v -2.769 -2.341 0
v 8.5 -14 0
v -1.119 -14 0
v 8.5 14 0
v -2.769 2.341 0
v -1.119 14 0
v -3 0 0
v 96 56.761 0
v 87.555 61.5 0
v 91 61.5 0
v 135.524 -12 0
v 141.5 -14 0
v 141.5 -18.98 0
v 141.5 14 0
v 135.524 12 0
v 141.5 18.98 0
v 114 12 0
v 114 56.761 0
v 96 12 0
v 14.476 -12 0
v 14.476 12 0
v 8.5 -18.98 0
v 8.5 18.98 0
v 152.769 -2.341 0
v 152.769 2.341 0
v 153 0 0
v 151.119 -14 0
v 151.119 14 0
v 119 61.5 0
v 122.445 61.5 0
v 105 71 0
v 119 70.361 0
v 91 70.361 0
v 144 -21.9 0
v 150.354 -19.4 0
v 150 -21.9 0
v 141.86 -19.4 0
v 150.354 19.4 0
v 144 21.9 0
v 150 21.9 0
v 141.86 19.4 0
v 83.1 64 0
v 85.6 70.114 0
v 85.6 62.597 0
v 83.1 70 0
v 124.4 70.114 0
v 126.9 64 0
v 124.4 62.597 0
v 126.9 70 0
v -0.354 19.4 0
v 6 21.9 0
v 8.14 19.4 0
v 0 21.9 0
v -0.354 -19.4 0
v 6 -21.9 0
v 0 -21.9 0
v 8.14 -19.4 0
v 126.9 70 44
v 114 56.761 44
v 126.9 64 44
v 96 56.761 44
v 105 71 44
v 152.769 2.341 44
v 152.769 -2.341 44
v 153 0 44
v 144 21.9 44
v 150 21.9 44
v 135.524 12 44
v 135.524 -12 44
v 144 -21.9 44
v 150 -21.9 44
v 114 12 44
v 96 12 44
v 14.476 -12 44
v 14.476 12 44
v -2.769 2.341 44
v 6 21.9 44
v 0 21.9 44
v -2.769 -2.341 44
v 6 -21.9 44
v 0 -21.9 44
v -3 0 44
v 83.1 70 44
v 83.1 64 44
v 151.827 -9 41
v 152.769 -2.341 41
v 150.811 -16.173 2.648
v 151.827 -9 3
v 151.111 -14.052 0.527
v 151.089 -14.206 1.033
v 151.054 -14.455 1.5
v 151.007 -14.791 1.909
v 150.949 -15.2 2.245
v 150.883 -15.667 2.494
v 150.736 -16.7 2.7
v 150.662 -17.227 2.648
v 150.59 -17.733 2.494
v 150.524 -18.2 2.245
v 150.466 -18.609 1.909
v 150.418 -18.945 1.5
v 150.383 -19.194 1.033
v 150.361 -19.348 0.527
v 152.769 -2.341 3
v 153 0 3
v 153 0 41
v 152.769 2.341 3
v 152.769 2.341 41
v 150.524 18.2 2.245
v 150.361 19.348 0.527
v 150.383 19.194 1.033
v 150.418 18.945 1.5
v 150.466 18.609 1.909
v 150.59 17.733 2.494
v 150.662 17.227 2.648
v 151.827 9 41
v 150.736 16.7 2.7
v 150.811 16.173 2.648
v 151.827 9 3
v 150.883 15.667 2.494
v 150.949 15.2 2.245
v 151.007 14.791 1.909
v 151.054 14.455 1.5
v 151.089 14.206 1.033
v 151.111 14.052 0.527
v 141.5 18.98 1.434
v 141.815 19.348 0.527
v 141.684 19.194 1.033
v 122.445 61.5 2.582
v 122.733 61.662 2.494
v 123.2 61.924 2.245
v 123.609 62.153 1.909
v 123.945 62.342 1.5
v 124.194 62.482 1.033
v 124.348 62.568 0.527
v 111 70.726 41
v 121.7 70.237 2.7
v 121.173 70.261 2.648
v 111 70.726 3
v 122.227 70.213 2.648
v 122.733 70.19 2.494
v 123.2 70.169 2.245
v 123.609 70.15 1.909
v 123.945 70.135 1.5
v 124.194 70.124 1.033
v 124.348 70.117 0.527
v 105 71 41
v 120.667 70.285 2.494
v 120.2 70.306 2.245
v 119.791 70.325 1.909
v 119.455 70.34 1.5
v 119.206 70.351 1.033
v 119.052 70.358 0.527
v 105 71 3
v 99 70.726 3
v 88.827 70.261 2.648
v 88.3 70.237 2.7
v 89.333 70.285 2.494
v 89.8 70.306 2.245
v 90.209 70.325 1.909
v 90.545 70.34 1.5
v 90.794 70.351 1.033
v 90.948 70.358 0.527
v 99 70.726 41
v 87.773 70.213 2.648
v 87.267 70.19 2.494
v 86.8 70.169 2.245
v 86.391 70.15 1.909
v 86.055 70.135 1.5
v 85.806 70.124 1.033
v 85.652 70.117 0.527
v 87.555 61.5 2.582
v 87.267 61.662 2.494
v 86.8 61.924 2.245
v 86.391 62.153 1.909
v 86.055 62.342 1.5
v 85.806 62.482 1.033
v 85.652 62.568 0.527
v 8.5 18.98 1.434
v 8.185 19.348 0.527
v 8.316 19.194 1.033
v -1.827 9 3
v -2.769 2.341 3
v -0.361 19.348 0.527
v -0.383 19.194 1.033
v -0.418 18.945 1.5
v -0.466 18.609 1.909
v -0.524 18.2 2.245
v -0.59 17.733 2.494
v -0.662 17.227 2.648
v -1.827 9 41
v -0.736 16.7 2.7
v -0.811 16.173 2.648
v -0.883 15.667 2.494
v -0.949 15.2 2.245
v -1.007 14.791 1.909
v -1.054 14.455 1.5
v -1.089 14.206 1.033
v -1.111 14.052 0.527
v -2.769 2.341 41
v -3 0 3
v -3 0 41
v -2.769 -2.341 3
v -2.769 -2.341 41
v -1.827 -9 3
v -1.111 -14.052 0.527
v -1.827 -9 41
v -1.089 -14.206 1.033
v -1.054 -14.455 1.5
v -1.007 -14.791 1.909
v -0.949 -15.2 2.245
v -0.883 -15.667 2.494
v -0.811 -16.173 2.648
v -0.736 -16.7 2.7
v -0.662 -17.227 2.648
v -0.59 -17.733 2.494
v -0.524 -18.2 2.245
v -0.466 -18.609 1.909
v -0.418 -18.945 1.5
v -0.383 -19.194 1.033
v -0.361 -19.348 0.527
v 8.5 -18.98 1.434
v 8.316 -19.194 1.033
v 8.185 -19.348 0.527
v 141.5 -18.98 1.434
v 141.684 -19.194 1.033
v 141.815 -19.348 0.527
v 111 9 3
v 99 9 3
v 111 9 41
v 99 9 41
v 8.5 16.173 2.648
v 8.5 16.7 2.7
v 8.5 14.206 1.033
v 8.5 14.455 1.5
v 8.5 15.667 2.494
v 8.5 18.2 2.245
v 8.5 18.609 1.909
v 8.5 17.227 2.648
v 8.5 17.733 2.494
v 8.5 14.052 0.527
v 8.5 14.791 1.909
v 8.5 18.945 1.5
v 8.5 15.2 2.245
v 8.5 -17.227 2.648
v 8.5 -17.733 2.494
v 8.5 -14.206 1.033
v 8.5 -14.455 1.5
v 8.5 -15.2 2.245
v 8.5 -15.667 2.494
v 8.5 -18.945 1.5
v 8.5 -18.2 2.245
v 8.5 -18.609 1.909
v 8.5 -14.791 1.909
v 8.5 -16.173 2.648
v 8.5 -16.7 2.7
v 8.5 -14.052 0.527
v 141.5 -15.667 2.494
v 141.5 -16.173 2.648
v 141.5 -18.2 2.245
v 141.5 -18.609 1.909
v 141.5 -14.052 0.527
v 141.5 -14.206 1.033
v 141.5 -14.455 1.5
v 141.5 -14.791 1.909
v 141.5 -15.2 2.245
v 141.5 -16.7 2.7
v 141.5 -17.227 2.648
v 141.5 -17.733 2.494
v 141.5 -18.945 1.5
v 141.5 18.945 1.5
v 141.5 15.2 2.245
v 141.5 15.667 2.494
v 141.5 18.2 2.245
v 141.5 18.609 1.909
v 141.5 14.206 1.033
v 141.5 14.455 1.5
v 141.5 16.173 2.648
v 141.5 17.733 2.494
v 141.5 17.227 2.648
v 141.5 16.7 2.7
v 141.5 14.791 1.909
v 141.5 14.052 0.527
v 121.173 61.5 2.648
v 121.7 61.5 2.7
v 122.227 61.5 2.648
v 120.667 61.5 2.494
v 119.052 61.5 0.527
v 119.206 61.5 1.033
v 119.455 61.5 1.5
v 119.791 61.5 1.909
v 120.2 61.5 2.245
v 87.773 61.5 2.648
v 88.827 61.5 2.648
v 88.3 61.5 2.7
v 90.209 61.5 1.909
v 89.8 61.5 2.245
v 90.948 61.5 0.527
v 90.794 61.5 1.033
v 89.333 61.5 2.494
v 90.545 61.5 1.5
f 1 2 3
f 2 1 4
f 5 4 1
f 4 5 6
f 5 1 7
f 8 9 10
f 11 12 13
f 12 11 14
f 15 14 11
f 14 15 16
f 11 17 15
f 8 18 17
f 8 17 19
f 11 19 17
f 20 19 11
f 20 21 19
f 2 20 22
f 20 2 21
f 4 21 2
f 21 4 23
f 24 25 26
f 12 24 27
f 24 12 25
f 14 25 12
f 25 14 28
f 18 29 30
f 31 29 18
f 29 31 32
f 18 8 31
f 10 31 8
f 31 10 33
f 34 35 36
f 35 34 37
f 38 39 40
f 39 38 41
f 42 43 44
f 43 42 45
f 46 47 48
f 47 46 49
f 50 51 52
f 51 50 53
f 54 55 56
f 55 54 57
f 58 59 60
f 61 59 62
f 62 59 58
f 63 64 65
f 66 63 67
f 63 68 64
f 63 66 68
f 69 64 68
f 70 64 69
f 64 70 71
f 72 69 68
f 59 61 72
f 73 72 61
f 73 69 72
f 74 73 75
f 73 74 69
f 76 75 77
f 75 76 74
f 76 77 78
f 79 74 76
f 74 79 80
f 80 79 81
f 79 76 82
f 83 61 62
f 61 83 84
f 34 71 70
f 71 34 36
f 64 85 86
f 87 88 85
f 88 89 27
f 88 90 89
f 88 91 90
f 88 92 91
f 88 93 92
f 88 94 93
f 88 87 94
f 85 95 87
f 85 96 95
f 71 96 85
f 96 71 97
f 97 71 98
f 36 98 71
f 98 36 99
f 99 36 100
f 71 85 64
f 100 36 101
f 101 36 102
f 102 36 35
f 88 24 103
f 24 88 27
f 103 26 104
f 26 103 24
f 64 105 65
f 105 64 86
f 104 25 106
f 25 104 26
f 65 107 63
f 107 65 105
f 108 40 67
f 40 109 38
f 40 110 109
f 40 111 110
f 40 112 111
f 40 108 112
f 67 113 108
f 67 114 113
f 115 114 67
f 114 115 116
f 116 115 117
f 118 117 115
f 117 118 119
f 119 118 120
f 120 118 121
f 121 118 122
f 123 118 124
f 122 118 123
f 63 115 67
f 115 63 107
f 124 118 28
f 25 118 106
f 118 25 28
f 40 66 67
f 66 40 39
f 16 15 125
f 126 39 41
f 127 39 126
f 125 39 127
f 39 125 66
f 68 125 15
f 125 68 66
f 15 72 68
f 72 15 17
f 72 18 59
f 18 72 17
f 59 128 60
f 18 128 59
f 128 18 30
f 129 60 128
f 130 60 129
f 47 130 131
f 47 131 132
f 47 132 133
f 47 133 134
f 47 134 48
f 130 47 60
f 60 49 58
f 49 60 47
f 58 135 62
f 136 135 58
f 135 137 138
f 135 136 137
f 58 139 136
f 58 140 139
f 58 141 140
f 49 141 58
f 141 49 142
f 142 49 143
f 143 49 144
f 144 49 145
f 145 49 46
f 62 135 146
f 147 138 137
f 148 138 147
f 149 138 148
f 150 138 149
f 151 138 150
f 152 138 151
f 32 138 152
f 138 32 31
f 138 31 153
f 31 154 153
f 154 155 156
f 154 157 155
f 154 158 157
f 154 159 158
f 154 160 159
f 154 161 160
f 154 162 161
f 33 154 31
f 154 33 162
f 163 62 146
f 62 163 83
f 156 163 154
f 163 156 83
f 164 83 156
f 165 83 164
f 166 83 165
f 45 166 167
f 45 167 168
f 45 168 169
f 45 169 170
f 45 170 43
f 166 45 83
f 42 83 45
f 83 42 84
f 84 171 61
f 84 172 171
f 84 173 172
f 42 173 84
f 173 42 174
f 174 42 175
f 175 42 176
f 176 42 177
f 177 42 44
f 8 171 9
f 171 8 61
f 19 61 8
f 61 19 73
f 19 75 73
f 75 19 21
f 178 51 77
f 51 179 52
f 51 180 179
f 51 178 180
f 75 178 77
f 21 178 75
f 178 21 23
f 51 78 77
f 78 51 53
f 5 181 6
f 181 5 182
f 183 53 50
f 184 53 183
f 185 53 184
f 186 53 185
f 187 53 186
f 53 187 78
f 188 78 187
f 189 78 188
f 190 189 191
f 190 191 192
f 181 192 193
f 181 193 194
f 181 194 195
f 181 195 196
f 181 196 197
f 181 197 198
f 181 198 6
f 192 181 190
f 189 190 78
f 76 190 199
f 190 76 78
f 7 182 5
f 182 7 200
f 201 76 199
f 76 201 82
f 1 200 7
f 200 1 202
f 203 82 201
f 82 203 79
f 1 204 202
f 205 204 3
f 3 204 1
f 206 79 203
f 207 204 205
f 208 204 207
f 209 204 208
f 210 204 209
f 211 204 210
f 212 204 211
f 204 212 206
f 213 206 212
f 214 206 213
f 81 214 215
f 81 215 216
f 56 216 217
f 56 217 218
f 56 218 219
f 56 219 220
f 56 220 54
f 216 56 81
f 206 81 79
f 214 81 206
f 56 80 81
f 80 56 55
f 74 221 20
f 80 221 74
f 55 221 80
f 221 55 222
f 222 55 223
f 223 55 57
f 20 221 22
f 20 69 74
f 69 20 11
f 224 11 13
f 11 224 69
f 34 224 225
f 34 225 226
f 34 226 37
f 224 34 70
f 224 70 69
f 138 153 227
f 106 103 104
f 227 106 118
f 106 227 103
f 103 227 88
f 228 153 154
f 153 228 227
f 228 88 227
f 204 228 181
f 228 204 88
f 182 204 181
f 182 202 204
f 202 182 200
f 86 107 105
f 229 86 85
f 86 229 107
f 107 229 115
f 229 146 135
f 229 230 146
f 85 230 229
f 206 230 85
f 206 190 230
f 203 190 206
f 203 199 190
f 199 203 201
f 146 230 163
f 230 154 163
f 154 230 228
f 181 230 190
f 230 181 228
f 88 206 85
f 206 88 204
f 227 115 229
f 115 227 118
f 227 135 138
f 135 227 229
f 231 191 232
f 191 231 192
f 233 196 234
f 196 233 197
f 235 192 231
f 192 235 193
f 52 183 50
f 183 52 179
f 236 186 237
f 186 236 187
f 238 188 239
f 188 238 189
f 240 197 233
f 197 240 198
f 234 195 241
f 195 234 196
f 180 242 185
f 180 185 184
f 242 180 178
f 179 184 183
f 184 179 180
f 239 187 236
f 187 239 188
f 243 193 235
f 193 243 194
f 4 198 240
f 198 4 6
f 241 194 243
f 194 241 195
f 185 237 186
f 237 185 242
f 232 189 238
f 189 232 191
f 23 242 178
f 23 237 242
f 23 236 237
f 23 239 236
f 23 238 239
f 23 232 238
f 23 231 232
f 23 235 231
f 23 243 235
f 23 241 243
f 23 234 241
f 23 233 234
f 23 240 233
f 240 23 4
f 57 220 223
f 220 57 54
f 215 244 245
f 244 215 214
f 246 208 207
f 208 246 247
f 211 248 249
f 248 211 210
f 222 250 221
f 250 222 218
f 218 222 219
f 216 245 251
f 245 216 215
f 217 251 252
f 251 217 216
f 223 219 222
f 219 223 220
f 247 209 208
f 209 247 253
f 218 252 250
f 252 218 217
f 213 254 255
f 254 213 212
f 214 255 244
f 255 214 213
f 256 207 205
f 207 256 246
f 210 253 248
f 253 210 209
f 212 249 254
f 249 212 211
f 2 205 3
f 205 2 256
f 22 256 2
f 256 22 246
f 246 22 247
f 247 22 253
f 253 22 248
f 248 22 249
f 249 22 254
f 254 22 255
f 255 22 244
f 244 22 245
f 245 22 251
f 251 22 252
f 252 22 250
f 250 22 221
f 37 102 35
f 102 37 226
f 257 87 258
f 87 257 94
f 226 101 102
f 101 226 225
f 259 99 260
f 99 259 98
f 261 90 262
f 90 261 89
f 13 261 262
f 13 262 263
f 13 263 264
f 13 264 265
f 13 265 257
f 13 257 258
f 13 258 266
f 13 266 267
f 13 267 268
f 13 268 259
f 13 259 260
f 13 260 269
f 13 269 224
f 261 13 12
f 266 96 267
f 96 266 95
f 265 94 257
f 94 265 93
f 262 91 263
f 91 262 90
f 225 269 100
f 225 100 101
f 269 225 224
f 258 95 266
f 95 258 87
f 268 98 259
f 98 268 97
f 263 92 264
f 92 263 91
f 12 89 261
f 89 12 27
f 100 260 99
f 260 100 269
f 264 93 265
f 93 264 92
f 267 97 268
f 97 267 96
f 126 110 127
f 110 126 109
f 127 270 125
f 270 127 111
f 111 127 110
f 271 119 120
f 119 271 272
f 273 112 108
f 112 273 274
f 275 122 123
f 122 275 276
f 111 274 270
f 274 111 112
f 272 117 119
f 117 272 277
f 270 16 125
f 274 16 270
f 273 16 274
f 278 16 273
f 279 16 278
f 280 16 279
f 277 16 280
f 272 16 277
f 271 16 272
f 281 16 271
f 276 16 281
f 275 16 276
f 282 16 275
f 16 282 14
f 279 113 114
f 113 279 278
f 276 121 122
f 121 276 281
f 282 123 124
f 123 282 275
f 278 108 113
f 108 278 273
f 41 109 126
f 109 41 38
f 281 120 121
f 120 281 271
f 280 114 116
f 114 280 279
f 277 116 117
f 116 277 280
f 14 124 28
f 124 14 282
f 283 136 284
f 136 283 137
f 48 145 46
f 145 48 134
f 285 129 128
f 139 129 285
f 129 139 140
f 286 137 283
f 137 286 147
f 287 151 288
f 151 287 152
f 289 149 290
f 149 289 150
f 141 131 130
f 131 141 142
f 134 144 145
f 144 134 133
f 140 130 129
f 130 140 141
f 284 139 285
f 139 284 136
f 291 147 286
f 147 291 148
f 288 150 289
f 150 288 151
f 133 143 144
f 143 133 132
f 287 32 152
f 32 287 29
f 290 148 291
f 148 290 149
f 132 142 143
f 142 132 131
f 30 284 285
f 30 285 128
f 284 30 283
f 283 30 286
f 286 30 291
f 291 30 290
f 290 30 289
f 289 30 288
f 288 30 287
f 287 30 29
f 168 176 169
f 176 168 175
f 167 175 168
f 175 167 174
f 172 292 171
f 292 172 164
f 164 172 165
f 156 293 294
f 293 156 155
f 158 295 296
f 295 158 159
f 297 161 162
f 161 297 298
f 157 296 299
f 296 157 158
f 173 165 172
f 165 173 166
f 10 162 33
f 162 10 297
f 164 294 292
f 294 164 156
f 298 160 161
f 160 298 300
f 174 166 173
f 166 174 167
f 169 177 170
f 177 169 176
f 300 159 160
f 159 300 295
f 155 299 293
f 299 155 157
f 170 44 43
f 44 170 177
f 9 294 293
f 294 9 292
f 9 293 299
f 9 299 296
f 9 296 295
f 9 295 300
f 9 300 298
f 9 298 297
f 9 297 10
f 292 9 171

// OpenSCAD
$fn = 32;

// ----------------------------------------------------------------------
// Air duct: 24 mm duct, 3 mm wall, 44 mm across
// ----------------------------------------------------------------------

// --- parameters (mm) ---
duct_r = 12;              // duct core radius
duct_d = 24;              // duct core diameter
wall = 3;                 // duct wall thickness
height = 44;              // duct width (extrusion height)
port_r = 21.9;            // port flange half width
port_d = 43.8;            // port flange width
port_t = 6;               // port flange thickness
bolt_d = 5.4;             // port bolt holes
bolt_offset = 16.7;       // bolt hole offset from the port axis
branch_r = 9;             // branch core radius
branch_d = 18;            // branch core diameter
branch_len = 70;          // branch length from the run axis

difference() {
  /* outer hull chain: tube with a flat flange plate at every port */
  linear_extrude(height = 44) {
    hull() {
      polygon([[0, -21.9], [0, 21.9], [6, 21.9], [6, -21.9]]);
      translate([9, 0]) circle(r = 12);
    }
    hull() {
      translate([9, 0]) circle(r = 12);
      translate([45, 0]) circle(r = 12);
    }
    hull() {
      translate([45, 0]) circle(r = 12);
      translate([105, 0]) circle(r = 12);
    }
    hull() {
      translate([105, 0]) circle(r = 12);
      translate([141, 0]) circle(r = 12);
    }
    hull() {
      translate([141, 0]) circle(r = 12);
      polygon([[150, 21.9], [150, -21.9], [144, -21.9], [144, 21.9]]);
    }
    hull() {
      translate([105, 0]) circle(r = 9);
      translate([105, 38.5]) circle(r = 9);
    }
    hull() {
      translate([105, 38.5]) circle(r = 9);
      translate([105, 62]) circle(r = 9);
    }
    hull() {
      translate([105, 62]) circle(r = 9);
      polygon([[83.1, 70], [126.9, 70], [126.9, 64], [83.1, 64]]);
    }
  }
  /* air passage: the same chain inset by the wall, 5 mm proud of the ports */
  translate([0, 0, 3]) linear_extrude(height = 38) {
    hull() {
      translate([-5, 0]) circle(r = 9);
      translate([45, 0]) circle(r = 9);
    }
    hull() {
      translate([45, 0]) circle(r = 9);
      translate([105, 0]) circle(r = 9);
    }
    hull() {
      translate([105, 0]) circle(r = 9);
      translate([155, 0]) circle(r = 9);
    }
    hull() {
      translate([105, 0]) circle(r = 6);
      translate([105, 38.5]) circle(r = 6);
    }
    hull() {
      translate([105, 38.5]) circle(r = 6);
      translate([105, 75]) circle(r = 6);
    }
  }
  translate([0, 0]) rotate([0, 0, -90]) translate([-16.7, -2.5]) rotate([-90, 0, 0]) cylinder(h = 11, d = 5.4);
  translate([0, 0]) rotate([0, 0, -90]) translate([16.7, -2.5]) rotate([-90, 0, 0]) cylinder(h = 11, d = 5.4);
  translate([150, 0]) rotate([0, 0, 90]) translate([-16.7, -2.5]) rotate([-90, 0, 0]) cylinder(h = 11, d = 5.4);
  translate([150, 0]) rotate([0, 0, 90]) translate([16.7, -2.5]) rotate([-90, 0, 0]) cylinder(h = 11, d = 5.4);
  translate([105, 70]) rotate([0, 0, 180]) translate([-16.7, -2.5]) rotate([-90, 0, 0]) cylinder(h = 11, d = 5.4);
  translate([105, 70]) rotate([0, 0, 180]) translate([16.7, -2.5]) rotate([-90, 0, 0]) cylinder(h = 11, d = 5.4);
}
